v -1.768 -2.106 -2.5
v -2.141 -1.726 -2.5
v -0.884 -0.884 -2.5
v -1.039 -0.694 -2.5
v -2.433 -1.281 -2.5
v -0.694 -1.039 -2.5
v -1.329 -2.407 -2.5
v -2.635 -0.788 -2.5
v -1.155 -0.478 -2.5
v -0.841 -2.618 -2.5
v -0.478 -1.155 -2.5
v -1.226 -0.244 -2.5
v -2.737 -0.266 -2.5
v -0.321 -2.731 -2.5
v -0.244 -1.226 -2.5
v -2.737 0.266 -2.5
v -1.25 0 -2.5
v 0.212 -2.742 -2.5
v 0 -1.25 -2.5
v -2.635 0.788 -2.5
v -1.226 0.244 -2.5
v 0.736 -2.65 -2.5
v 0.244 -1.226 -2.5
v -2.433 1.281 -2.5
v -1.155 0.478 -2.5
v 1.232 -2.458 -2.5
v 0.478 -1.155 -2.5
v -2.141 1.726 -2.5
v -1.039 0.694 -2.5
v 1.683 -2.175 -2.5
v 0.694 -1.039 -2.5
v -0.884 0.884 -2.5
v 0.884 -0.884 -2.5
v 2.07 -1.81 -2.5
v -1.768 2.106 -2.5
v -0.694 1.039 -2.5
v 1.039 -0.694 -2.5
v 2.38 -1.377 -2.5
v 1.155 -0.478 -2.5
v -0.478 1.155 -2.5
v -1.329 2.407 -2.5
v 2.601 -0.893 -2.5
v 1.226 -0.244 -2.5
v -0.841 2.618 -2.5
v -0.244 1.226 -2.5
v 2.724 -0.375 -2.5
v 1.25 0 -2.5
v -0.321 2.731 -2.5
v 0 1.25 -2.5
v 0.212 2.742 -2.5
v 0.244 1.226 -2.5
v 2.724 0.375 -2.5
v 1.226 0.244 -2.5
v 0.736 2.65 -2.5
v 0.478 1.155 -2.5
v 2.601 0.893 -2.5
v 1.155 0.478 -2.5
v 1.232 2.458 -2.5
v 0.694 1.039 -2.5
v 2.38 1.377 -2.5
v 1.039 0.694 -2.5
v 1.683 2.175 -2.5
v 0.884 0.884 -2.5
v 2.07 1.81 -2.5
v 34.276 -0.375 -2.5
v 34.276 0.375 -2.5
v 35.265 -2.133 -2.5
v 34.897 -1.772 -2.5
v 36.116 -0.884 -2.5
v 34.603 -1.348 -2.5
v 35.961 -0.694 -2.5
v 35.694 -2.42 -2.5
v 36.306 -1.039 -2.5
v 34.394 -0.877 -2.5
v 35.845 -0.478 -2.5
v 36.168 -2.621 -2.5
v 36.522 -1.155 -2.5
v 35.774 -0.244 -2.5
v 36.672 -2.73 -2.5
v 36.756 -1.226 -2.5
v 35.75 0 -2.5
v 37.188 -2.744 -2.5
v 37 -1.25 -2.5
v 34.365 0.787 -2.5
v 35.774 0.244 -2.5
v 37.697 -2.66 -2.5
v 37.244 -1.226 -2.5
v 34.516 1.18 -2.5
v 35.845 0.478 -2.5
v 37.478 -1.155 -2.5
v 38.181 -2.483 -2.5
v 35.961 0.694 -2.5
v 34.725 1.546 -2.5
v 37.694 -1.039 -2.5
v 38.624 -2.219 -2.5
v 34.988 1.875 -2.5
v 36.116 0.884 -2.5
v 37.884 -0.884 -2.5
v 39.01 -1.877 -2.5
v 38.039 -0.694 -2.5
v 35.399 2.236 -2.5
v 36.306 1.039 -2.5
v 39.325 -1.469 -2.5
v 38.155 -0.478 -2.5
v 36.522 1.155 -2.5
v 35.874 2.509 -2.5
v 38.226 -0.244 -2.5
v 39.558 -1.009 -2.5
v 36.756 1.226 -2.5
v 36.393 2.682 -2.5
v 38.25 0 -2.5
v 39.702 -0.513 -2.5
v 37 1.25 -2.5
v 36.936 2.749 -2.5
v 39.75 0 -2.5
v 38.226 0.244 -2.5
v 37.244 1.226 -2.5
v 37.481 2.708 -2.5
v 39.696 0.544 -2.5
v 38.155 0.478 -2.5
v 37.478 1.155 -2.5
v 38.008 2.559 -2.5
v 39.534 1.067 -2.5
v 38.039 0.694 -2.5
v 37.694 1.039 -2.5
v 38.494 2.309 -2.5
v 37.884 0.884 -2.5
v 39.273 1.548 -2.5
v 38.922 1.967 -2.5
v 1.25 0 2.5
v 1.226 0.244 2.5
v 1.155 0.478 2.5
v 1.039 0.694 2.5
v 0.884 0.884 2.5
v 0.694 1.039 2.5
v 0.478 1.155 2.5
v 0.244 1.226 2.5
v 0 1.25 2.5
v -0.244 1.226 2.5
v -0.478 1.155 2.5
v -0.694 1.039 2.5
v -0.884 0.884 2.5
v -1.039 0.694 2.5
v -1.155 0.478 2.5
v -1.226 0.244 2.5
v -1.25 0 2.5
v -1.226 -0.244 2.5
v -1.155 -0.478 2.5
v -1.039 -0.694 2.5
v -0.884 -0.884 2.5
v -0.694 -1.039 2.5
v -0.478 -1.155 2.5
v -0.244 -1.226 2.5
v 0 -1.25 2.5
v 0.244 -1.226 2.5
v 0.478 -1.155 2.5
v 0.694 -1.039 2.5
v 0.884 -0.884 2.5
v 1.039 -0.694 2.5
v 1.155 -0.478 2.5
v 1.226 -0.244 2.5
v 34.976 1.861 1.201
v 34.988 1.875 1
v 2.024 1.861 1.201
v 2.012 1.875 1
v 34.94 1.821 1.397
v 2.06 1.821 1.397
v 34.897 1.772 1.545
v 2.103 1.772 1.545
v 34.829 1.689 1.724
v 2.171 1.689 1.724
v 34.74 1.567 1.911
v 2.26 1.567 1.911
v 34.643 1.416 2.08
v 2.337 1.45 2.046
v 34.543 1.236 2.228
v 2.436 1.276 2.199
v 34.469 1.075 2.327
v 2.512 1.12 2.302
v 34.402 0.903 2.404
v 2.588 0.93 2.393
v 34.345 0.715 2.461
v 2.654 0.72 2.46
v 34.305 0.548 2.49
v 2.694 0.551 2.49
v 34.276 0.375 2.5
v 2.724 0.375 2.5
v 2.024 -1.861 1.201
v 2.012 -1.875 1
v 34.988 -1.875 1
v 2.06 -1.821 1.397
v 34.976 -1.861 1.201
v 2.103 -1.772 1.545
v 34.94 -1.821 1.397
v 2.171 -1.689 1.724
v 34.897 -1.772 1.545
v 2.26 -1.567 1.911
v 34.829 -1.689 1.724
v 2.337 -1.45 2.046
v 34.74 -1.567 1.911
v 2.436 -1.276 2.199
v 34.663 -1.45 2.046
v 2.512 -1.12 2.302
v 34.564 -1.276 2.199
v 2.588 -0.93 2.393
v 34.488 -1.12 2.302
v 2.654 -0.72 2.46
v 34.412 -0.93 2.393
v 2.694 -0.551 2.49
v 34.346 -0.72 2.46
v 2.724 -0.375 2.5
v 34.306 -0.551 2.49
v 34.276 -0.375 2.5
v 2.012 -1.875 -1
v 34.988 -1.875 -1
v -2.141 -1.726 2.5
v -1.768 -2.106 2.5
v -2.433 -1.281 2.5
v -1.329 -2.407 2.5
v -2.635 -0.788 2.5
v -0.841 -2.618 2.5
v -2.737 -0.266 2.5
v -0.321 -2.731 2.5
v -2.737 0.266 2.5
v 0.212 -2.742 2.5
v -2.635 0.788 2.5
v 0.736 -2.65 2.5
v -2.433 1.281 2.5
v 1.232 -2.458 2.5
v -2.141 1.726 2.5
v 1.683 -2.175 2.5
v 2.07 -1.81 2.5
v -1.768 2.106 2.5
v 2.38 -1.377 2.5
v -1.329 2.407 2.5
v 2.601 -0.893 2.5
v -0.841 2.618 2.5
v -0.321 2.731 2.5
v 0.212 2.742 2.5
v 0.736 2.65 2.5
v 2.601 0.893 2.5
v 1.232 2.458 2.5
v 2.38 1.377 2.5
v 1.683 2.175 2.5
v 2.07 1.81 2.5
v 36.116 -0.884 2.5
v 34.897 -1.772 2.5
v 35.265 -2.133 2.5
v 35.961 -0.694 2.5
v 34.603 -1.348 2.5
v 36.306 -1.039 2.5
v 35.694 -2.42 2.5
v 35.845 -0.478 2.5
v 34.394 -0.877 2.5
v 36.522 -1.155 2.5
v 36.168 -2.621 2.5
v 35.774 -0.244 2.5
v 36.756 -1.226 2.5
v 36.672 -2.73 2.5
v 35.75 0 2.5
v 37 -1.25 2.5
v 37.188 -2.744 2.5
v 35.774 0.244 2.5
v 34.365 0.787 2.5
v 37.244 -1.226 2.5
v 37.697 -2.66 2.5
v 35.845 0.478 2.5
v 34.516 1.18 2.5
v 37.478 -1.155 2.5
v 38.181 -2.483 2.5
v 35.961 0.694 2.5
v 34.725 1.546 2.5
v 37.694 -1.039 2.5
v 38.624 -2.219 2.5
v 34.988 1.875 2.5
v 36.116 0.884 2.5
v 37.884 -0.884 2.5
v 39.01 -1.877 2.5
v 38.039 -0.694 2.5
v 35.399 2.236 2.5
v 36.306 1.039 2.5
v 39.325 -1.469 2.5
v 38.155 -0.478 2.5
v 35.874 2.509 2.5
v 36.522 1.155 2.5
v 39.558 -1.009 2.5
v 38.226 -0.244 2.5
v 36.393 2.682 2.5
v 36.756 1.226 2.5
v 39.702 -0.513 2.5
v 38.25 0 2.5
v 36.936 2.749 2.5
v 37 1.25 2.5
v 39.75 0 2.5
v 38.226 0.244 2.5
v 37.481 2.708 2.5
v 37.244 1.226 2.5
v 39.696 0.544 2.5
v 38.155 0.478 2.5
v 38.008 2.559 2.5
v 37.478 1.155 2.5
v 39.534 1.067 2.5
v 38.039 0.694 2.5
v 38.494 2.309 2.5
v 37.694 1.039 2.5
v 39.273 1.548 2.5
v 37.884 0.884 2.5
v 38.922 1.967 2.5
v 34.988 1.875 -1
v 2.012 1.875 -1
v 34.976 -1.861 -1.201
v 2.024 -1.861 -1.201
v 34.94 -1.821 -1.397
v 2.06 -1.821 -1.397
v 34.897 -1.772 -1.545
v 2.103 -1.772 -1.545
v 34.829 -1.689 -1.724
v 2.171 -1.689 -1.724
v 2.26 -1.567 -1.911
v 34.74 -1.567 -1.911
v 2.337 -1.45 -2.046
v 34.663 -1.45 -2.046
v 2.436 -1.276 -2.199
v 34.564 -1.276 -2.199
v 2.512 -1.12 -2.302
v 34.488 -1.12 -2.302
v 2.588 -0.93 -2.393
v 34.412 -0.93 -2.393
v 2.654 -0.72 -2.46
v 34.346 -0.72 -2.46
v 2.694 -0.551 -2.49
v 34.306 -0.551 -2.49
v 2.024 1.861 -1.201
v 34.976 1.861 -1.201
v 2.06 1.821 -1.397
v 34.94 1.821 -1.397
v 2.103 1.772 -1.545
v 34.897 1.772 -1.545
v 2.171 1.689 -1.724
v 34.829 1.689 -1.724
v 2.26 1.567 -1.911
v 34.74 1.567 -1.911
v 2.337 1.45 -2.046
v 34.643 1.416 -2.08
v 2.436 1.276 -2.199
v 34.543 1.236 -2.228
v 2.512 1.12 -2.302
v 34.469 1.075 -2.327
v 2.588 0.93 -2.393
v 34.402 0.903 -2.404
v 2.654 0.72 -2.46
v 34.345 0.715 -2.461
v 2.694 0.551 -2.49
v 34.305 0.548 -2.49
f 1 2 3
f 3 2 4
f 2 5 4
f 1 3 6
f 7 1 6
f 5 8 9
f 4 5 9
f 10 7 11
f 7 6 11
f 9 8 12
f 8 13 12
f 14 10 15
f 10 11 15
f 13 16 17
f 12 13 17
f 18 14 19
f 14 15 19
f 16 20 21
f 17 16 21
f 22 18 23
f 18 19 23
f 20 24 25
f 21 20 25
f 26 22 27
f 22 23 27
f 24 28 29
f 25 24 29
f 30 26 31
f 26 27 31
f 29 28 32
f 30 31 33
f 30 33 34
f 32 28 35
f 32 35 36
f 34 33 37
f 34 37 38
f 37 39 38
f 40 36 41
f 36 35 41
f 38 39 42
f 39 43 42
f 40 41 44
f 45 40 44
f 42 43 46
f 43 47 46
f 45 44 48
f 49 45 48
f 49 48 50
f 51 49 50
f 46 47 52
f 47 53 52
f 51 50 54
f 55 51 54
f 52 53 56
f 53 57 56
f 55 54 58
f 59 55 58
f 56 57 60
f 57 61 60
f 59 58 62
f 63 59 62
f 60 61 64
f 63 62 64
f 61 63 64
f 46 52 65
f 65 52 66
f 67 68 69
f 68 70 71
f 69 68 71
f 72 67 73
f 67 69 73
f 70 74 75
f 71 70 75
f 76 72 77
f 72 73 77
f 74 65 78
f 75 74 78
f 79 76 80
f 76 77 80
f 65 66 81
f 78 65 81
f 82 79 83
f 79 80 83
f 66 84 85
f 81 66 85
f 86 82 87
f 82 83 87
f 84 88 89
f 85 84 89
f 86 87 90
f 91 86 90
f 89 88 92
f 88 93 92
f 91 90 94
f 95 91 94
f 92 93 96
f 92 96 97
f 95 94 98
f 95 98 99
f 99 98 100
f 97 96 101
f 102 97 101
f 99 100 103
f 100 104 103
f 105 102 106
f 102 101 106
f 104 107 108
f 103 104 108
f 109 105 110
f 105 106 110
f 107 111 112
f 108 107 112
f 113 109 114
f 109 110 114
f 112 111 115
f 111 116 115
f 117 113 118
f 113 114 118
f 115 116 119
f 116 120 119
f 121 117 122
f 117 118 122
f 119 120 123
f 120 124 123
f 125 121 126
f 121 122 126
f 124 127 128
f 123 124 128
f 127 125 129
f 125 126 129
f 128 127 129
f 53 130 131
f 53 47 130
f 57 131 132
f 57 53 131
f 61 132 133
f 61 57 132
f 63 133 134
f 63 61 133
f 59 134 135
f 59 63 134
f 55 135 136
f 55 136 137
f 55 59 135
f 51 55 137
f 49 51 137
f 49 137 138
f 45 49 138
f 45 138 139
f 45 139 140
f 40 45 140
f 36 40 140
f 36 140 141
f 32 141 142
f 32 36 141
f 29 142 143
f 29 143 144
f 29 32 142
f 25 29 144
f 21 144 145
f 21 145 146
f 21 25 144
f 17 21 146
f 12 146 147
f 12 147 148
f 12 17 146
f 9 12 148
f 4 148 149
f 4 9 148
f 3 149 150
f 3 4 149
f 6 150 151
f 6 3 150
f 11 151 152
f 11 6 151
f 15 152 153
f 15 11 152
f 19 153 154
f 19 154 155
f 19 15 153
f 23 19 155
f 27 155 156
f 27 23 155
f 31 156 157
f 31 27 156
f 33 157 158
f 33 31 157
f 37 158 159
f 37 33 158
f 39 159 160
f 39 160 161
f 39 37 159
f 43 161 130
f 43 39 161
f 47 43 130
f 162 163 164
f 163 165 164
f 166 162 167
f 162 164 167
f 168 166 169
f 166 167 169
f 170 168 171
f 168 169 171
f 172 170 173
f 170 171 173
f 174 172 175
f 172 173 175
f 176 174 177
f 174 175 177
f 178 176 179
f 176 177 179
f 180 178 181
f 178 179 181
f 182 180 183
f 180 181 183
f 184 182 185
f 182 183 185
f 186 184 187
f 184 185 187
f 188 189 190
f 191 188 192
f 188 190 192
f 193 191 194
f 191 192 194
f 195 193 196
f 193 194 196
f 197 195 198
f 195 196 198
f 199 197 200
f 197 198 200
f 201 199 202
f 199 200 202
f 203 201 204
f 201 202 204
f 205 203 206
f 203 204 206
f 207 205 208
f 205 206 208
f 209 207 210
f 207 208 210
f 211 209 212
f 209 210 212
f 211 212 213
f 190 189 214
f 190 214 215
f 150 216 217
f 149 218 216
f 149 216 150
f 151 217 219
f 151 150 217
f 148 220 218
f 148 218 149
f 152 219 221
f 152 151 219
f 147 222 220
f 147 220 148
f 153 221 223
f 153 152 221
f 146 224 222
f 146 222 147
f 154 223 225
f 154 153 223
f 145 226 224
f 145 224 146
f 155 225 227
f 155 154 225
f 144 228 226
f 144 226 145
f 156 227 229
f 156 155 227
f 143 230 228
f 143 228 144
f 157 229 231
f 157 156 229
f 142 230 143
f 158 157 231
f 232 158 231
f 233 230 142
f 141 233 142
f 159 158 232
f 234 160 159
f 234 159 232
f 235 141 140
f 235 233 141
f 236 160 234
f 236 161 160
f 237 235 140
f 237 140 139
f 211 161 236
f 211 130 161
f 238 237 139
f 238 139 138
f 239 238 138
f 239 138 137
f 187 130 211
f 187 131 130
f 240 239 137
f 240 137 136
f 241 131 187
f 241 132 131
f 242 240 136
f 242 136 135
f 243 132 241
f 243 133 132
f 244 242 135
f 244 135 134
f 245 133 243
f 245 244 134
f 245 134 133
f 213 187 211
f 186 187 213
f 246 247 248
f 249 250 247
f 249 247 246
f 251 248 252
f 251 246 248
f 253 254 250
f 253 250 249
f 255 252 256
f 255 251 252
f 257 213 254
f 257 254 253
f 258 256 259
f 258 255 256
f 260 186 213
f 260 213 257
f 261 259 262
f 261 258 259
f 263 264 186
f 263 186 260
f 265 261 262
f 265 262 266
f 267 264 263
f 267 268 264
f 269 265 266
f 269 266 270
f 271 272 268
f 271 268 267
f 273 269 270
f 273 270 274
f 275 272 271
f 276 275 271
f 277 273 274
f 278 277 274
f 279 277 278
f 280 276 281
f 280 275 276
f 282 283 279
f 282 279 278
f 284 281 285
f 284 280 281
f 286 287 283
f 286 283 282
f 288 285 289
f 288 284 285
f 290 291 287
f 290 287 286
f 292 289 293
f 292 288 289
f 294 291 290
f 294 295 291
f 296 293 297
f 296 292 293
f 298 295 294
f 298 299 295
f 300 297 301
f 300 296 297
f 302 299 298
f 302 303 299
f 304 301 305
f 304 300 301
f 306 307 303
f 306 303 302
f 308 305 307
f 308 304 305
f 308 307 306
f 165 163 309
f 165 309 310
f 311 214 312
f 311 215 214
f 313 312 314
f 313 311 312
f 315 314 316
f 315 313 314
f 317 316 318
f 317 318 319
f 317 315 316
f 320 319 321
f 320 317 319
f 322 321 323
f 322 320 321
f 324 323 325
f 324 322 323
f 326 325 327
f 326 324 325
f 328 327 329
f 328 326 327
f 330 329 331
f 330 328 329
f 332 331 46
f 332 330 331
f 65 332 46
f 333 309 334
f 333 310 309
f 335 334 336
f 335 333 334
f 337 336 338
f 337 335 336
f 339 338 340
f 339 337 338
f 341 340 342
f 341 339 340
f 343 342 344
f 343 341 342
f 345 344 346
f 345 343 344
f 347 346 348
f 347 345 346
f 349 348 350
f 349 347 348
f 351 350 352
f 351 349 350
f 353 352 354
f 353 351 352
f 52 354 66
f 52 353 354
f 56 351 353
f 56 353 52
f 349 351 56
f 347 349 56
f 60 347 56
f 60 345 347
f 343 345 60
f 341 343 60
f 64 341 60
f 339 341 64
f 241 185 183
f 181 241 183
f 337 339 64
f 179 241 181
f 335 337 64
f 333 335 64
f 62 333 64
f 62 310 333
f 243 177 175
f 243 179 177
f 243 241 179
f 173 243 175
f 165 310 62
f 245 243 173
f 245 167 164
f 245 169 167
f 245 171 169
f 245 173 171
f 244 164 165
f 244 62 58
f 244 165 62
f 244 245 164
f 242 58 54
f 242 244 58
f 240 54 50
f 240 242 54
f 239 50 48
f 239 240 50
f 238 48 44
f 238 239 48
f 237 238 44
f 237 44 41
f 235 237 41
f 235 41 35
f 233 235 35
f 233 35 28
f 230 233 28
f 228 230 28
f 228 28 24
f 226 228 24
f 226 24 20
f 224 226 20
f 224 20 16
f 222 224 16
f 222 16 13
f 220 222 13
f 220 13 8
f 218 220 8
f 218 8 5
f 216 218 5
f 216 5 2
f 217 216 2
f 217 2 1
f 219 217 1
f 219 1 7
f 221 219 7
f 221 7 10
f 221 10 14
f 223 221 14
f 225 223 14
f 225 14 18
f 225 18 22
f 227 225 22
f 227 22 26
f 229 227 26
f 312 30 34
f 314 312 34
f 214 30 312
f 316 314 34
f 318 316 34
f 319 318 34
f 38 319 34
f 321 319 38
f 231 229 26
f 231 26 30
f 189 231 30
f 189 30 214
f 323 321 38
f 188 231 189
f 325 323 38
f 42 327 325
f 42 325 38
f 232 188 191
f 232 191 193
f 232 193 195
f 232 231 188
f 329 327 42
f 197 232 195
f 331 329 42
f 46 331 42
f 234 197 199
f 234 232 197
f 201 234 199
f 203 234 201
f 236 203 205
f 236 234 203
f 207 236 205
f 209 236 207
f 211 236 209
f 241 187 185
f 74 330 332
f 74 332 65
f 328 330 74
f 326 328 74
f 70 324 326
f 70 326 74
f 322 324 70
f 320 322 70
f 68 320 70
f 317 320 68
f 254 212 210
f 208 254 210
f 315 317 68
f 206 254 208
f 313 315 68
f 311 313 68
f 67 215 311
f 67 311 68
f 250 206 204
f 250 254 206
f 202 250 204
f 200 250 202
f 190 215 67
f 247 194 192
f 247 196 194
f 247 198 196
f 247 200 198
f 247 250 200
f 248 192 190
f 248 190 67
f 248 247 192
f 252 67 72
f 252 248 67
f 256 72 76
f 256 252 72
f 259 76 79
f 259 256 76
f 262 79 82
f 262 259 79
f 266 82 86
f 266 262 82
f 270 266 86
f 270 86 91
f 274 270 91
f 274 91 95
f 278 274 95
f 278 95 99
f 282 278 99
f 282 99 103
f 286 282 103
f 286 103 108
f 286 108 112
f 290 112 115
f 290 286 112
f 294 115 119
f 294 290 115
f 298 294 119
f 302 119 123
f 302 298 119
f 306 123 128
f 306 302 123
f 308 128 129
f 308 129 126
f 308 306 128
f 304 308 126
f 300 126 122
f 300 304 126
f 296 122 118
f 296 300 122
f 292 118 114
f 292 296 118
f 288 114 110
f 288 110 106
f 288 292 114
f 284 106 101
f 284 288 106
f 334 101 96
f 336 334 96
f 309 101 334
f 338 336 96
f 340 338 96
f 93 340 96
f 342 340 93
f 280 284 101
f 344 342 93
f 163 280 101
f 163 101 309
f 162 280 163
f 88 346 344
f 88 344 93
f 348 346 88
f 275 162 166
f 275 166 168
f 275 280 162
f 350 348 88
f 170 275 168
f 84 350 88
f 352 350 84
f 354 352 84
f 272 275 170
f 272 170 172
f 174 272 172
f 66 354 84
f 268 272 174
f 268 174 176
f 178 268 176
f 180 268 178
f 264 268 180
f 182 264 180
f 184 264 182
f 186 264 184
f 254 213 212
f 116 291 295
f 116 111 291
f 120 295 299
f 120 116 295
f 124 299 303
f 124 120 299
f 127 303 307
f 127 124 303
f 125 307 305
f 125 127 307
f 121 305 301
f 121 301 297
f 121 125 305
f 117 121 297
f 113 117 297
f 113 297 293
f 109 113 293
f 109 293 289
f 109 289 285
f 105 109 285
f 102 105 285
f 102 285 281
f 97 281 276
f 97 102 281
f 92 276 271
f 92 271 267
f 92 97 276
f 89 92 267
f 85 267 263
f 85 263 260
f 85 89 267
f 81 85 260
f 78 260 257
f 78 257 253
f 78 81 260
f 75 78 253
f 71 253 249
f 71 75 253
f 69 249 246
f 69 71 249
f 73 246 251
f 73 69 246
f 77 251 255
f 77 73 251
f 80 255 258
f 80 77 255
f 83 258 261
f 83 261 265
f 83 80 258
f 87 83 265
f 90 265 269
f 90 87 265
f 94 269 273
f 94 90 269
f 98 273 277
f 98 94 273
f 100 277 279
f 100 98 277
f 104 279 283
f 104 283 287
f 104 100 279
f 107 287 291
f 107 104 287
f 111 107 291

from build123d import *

# Parameters (mm, degrees)
F0_R     = 1.25
F1_DEPTH = 2.5
F2_R     = 1.5


with BuildPart() as f1:
    # F0 (on Top) → F1 (new body, symmetric)
    with BuildSketch(Plane.XY):
        with BuildLine():
            ThreePointArc((2.0116846174, 1.875), (2.5587724301, 1.0075632243), (2.75, 0))
            ThreePointArc((2.75, 0), (2.5587724301, -1.0075632243), (2.0116846174, -1.875))
            Line((2.0116846174, -1.875), (34.9883153826, -1.875))
            ThreePointArc((34.9883153826, -1.875), (34.25, 0), (34.9883153826, 1.875))
            Line((34.9883153826, 1.875), (2.0116846174, 1.875))
        make_face()
        with BuildLine():
            ThreePointArc((2.0116846174, -1.875), (2.5587724301, -1.0075632243), (2.75, 0))
            ThreePointArc((2.75, 0), (2.5587724301, 1.0075632243), (2.0116846174, 1.875))
            ThreePointArc((2.0116846174, 1.875), (-2.75, 0), (2.0116846174, -1.875))
        make_face()
        Circle(F0_R, mode=Mode.SUBTRACT)
        with BuildLine():
            ThreePointArc((39.75, 0), (38.0075632243, 2.5587724301), (34.9883153826, 1.875))
            ThreePointArc((34.9883153826, 1.875), (34.25, 0), (34.9883153826, -1.875))
            ThreePointArc((34.9883153826, -1.875), (38.0075632243, -2.5587724301), (39.75, 0))
        make_face()
        with Locations((37, 0)):
            Circle(F0_R, mode=Mode.SUBTRACT)
    extrude(amount=F1_DEPTH, both=True)

    # F2
    f2_edges = [f1.edges().sort_by_distance(p)[0] for p in [
        (18.5, 1.875, 2.5),
        (18.5, -1.875, 2.5),
        (18.5, -1.875, -2.5),
        (18.5, 1.875, -2.5),
    ]]
    fillet(f2_edges, radius=F2_R)


solid = f1.part
